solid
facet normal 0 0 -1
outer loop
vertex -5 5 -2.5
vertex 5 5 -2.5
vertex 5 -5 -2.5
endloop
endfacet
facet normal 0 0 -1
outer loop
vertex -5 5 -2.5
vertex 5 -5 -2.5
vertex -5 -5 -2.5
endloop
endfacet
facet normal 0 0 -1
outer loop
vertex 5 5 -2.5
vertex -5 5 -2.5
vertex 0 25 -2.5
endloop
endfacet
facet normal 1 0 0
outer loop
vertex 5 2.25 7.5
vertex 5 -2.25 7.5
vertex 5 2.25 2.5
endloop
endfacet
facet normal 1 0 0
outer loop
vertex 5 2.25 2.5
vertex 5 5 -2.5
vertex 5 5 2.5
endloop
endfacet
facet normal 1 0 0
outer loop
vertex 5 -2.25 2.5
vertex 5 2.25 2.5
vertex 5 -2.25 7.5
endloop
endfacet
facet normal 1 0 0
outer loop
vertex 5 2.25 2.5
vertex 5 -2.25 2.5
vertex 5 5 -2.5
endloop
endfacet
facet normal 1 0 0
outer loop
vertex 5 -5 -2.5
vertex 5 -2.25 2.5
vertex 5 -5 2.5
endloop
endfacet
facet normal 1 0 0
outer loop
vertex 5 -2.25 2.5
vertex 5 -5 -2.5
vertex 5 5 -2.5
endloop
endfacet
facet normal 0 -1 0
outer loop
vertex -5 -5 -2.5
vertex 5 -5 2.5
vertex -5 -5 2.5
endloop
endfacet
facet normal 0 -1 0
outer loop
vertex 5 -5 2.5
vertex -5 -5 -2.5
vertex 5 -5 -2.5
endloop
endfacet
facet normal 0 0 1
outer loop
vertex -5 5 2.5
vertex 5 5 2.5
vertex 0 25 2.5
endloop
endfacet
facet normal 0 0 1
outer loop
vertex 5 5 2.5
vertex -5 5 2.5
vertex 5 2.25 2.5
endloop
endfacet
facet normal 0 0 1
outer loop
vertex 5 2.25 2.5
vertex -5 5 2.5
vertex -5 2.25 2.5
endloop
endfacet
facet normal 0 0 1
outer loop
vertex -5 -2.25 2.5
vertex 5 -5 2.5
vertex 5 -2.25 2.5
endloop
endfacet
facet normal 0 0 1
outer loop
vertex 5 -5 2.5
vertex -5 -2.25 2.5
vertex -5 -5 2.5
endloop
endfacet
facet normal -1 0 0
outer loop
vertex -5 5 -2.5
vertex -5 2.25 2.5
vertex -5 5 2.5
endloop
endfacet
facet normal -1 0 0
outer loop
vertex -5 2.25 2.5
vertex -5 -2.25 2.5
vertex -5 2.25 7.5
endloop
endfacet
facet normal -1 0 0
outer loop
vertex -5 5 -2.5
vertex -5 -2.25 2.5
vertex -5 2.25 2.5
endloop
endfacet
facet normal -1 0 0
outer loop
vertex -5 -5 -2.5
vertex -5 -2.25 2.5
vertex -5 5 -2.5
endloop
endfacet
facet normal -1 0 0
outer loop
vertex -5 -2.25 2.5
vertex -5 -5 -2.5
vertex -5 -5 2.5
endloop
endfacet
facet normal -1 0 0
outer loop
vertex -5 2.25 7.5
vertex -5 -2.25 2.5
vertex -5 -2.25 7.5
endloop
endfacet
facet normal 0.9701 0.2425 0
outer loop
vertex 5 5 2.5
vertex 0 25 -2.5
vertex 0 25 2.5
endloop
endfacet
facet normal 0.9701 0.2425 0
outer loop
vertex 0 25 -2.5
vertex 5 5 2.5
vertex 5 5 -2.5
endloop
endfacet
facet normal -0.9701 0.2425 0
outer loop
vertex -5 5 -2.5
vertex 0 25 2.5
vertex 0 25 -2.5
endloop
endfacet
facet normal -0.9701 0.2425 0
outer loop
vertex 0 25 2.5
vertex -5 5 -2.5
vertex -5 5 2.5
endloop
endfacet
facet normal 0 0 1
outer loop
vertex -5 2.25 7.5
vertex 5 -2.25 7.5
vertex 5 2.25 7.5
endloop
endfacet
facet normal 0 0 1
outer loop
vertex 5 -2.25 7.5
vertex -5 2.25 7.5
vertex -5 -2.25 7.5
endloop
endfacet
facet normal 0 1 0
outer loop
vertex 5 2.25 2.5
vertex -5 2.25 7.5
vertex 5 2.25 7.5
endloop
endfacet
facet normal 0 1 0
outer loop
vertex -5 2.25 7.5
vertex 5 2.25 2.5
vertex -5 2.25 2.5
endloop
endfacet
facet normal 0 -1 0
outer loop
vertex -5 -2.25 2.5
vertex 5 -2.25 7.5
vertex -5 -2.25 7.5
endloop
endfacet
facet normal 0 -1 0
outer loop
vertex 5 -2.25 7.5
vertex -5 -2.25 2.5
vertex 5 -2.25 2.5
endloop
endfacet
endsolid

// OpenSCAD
union() {
  linear_extrude(height = 5, center = true)
  polygon(points = [[-5, -5], [5, -5], [5, 5], [-5, 5]]);
  translate(v = [0, 5, 0])
  linear_extrude(height = 5, center = true)
  polygon(points = [[-5, 0], [5, 0], [0, 20]]);
  translate(v = [0, 0, 5]) 
  cube(size = [10, 4.5, 5], center = true);
}
